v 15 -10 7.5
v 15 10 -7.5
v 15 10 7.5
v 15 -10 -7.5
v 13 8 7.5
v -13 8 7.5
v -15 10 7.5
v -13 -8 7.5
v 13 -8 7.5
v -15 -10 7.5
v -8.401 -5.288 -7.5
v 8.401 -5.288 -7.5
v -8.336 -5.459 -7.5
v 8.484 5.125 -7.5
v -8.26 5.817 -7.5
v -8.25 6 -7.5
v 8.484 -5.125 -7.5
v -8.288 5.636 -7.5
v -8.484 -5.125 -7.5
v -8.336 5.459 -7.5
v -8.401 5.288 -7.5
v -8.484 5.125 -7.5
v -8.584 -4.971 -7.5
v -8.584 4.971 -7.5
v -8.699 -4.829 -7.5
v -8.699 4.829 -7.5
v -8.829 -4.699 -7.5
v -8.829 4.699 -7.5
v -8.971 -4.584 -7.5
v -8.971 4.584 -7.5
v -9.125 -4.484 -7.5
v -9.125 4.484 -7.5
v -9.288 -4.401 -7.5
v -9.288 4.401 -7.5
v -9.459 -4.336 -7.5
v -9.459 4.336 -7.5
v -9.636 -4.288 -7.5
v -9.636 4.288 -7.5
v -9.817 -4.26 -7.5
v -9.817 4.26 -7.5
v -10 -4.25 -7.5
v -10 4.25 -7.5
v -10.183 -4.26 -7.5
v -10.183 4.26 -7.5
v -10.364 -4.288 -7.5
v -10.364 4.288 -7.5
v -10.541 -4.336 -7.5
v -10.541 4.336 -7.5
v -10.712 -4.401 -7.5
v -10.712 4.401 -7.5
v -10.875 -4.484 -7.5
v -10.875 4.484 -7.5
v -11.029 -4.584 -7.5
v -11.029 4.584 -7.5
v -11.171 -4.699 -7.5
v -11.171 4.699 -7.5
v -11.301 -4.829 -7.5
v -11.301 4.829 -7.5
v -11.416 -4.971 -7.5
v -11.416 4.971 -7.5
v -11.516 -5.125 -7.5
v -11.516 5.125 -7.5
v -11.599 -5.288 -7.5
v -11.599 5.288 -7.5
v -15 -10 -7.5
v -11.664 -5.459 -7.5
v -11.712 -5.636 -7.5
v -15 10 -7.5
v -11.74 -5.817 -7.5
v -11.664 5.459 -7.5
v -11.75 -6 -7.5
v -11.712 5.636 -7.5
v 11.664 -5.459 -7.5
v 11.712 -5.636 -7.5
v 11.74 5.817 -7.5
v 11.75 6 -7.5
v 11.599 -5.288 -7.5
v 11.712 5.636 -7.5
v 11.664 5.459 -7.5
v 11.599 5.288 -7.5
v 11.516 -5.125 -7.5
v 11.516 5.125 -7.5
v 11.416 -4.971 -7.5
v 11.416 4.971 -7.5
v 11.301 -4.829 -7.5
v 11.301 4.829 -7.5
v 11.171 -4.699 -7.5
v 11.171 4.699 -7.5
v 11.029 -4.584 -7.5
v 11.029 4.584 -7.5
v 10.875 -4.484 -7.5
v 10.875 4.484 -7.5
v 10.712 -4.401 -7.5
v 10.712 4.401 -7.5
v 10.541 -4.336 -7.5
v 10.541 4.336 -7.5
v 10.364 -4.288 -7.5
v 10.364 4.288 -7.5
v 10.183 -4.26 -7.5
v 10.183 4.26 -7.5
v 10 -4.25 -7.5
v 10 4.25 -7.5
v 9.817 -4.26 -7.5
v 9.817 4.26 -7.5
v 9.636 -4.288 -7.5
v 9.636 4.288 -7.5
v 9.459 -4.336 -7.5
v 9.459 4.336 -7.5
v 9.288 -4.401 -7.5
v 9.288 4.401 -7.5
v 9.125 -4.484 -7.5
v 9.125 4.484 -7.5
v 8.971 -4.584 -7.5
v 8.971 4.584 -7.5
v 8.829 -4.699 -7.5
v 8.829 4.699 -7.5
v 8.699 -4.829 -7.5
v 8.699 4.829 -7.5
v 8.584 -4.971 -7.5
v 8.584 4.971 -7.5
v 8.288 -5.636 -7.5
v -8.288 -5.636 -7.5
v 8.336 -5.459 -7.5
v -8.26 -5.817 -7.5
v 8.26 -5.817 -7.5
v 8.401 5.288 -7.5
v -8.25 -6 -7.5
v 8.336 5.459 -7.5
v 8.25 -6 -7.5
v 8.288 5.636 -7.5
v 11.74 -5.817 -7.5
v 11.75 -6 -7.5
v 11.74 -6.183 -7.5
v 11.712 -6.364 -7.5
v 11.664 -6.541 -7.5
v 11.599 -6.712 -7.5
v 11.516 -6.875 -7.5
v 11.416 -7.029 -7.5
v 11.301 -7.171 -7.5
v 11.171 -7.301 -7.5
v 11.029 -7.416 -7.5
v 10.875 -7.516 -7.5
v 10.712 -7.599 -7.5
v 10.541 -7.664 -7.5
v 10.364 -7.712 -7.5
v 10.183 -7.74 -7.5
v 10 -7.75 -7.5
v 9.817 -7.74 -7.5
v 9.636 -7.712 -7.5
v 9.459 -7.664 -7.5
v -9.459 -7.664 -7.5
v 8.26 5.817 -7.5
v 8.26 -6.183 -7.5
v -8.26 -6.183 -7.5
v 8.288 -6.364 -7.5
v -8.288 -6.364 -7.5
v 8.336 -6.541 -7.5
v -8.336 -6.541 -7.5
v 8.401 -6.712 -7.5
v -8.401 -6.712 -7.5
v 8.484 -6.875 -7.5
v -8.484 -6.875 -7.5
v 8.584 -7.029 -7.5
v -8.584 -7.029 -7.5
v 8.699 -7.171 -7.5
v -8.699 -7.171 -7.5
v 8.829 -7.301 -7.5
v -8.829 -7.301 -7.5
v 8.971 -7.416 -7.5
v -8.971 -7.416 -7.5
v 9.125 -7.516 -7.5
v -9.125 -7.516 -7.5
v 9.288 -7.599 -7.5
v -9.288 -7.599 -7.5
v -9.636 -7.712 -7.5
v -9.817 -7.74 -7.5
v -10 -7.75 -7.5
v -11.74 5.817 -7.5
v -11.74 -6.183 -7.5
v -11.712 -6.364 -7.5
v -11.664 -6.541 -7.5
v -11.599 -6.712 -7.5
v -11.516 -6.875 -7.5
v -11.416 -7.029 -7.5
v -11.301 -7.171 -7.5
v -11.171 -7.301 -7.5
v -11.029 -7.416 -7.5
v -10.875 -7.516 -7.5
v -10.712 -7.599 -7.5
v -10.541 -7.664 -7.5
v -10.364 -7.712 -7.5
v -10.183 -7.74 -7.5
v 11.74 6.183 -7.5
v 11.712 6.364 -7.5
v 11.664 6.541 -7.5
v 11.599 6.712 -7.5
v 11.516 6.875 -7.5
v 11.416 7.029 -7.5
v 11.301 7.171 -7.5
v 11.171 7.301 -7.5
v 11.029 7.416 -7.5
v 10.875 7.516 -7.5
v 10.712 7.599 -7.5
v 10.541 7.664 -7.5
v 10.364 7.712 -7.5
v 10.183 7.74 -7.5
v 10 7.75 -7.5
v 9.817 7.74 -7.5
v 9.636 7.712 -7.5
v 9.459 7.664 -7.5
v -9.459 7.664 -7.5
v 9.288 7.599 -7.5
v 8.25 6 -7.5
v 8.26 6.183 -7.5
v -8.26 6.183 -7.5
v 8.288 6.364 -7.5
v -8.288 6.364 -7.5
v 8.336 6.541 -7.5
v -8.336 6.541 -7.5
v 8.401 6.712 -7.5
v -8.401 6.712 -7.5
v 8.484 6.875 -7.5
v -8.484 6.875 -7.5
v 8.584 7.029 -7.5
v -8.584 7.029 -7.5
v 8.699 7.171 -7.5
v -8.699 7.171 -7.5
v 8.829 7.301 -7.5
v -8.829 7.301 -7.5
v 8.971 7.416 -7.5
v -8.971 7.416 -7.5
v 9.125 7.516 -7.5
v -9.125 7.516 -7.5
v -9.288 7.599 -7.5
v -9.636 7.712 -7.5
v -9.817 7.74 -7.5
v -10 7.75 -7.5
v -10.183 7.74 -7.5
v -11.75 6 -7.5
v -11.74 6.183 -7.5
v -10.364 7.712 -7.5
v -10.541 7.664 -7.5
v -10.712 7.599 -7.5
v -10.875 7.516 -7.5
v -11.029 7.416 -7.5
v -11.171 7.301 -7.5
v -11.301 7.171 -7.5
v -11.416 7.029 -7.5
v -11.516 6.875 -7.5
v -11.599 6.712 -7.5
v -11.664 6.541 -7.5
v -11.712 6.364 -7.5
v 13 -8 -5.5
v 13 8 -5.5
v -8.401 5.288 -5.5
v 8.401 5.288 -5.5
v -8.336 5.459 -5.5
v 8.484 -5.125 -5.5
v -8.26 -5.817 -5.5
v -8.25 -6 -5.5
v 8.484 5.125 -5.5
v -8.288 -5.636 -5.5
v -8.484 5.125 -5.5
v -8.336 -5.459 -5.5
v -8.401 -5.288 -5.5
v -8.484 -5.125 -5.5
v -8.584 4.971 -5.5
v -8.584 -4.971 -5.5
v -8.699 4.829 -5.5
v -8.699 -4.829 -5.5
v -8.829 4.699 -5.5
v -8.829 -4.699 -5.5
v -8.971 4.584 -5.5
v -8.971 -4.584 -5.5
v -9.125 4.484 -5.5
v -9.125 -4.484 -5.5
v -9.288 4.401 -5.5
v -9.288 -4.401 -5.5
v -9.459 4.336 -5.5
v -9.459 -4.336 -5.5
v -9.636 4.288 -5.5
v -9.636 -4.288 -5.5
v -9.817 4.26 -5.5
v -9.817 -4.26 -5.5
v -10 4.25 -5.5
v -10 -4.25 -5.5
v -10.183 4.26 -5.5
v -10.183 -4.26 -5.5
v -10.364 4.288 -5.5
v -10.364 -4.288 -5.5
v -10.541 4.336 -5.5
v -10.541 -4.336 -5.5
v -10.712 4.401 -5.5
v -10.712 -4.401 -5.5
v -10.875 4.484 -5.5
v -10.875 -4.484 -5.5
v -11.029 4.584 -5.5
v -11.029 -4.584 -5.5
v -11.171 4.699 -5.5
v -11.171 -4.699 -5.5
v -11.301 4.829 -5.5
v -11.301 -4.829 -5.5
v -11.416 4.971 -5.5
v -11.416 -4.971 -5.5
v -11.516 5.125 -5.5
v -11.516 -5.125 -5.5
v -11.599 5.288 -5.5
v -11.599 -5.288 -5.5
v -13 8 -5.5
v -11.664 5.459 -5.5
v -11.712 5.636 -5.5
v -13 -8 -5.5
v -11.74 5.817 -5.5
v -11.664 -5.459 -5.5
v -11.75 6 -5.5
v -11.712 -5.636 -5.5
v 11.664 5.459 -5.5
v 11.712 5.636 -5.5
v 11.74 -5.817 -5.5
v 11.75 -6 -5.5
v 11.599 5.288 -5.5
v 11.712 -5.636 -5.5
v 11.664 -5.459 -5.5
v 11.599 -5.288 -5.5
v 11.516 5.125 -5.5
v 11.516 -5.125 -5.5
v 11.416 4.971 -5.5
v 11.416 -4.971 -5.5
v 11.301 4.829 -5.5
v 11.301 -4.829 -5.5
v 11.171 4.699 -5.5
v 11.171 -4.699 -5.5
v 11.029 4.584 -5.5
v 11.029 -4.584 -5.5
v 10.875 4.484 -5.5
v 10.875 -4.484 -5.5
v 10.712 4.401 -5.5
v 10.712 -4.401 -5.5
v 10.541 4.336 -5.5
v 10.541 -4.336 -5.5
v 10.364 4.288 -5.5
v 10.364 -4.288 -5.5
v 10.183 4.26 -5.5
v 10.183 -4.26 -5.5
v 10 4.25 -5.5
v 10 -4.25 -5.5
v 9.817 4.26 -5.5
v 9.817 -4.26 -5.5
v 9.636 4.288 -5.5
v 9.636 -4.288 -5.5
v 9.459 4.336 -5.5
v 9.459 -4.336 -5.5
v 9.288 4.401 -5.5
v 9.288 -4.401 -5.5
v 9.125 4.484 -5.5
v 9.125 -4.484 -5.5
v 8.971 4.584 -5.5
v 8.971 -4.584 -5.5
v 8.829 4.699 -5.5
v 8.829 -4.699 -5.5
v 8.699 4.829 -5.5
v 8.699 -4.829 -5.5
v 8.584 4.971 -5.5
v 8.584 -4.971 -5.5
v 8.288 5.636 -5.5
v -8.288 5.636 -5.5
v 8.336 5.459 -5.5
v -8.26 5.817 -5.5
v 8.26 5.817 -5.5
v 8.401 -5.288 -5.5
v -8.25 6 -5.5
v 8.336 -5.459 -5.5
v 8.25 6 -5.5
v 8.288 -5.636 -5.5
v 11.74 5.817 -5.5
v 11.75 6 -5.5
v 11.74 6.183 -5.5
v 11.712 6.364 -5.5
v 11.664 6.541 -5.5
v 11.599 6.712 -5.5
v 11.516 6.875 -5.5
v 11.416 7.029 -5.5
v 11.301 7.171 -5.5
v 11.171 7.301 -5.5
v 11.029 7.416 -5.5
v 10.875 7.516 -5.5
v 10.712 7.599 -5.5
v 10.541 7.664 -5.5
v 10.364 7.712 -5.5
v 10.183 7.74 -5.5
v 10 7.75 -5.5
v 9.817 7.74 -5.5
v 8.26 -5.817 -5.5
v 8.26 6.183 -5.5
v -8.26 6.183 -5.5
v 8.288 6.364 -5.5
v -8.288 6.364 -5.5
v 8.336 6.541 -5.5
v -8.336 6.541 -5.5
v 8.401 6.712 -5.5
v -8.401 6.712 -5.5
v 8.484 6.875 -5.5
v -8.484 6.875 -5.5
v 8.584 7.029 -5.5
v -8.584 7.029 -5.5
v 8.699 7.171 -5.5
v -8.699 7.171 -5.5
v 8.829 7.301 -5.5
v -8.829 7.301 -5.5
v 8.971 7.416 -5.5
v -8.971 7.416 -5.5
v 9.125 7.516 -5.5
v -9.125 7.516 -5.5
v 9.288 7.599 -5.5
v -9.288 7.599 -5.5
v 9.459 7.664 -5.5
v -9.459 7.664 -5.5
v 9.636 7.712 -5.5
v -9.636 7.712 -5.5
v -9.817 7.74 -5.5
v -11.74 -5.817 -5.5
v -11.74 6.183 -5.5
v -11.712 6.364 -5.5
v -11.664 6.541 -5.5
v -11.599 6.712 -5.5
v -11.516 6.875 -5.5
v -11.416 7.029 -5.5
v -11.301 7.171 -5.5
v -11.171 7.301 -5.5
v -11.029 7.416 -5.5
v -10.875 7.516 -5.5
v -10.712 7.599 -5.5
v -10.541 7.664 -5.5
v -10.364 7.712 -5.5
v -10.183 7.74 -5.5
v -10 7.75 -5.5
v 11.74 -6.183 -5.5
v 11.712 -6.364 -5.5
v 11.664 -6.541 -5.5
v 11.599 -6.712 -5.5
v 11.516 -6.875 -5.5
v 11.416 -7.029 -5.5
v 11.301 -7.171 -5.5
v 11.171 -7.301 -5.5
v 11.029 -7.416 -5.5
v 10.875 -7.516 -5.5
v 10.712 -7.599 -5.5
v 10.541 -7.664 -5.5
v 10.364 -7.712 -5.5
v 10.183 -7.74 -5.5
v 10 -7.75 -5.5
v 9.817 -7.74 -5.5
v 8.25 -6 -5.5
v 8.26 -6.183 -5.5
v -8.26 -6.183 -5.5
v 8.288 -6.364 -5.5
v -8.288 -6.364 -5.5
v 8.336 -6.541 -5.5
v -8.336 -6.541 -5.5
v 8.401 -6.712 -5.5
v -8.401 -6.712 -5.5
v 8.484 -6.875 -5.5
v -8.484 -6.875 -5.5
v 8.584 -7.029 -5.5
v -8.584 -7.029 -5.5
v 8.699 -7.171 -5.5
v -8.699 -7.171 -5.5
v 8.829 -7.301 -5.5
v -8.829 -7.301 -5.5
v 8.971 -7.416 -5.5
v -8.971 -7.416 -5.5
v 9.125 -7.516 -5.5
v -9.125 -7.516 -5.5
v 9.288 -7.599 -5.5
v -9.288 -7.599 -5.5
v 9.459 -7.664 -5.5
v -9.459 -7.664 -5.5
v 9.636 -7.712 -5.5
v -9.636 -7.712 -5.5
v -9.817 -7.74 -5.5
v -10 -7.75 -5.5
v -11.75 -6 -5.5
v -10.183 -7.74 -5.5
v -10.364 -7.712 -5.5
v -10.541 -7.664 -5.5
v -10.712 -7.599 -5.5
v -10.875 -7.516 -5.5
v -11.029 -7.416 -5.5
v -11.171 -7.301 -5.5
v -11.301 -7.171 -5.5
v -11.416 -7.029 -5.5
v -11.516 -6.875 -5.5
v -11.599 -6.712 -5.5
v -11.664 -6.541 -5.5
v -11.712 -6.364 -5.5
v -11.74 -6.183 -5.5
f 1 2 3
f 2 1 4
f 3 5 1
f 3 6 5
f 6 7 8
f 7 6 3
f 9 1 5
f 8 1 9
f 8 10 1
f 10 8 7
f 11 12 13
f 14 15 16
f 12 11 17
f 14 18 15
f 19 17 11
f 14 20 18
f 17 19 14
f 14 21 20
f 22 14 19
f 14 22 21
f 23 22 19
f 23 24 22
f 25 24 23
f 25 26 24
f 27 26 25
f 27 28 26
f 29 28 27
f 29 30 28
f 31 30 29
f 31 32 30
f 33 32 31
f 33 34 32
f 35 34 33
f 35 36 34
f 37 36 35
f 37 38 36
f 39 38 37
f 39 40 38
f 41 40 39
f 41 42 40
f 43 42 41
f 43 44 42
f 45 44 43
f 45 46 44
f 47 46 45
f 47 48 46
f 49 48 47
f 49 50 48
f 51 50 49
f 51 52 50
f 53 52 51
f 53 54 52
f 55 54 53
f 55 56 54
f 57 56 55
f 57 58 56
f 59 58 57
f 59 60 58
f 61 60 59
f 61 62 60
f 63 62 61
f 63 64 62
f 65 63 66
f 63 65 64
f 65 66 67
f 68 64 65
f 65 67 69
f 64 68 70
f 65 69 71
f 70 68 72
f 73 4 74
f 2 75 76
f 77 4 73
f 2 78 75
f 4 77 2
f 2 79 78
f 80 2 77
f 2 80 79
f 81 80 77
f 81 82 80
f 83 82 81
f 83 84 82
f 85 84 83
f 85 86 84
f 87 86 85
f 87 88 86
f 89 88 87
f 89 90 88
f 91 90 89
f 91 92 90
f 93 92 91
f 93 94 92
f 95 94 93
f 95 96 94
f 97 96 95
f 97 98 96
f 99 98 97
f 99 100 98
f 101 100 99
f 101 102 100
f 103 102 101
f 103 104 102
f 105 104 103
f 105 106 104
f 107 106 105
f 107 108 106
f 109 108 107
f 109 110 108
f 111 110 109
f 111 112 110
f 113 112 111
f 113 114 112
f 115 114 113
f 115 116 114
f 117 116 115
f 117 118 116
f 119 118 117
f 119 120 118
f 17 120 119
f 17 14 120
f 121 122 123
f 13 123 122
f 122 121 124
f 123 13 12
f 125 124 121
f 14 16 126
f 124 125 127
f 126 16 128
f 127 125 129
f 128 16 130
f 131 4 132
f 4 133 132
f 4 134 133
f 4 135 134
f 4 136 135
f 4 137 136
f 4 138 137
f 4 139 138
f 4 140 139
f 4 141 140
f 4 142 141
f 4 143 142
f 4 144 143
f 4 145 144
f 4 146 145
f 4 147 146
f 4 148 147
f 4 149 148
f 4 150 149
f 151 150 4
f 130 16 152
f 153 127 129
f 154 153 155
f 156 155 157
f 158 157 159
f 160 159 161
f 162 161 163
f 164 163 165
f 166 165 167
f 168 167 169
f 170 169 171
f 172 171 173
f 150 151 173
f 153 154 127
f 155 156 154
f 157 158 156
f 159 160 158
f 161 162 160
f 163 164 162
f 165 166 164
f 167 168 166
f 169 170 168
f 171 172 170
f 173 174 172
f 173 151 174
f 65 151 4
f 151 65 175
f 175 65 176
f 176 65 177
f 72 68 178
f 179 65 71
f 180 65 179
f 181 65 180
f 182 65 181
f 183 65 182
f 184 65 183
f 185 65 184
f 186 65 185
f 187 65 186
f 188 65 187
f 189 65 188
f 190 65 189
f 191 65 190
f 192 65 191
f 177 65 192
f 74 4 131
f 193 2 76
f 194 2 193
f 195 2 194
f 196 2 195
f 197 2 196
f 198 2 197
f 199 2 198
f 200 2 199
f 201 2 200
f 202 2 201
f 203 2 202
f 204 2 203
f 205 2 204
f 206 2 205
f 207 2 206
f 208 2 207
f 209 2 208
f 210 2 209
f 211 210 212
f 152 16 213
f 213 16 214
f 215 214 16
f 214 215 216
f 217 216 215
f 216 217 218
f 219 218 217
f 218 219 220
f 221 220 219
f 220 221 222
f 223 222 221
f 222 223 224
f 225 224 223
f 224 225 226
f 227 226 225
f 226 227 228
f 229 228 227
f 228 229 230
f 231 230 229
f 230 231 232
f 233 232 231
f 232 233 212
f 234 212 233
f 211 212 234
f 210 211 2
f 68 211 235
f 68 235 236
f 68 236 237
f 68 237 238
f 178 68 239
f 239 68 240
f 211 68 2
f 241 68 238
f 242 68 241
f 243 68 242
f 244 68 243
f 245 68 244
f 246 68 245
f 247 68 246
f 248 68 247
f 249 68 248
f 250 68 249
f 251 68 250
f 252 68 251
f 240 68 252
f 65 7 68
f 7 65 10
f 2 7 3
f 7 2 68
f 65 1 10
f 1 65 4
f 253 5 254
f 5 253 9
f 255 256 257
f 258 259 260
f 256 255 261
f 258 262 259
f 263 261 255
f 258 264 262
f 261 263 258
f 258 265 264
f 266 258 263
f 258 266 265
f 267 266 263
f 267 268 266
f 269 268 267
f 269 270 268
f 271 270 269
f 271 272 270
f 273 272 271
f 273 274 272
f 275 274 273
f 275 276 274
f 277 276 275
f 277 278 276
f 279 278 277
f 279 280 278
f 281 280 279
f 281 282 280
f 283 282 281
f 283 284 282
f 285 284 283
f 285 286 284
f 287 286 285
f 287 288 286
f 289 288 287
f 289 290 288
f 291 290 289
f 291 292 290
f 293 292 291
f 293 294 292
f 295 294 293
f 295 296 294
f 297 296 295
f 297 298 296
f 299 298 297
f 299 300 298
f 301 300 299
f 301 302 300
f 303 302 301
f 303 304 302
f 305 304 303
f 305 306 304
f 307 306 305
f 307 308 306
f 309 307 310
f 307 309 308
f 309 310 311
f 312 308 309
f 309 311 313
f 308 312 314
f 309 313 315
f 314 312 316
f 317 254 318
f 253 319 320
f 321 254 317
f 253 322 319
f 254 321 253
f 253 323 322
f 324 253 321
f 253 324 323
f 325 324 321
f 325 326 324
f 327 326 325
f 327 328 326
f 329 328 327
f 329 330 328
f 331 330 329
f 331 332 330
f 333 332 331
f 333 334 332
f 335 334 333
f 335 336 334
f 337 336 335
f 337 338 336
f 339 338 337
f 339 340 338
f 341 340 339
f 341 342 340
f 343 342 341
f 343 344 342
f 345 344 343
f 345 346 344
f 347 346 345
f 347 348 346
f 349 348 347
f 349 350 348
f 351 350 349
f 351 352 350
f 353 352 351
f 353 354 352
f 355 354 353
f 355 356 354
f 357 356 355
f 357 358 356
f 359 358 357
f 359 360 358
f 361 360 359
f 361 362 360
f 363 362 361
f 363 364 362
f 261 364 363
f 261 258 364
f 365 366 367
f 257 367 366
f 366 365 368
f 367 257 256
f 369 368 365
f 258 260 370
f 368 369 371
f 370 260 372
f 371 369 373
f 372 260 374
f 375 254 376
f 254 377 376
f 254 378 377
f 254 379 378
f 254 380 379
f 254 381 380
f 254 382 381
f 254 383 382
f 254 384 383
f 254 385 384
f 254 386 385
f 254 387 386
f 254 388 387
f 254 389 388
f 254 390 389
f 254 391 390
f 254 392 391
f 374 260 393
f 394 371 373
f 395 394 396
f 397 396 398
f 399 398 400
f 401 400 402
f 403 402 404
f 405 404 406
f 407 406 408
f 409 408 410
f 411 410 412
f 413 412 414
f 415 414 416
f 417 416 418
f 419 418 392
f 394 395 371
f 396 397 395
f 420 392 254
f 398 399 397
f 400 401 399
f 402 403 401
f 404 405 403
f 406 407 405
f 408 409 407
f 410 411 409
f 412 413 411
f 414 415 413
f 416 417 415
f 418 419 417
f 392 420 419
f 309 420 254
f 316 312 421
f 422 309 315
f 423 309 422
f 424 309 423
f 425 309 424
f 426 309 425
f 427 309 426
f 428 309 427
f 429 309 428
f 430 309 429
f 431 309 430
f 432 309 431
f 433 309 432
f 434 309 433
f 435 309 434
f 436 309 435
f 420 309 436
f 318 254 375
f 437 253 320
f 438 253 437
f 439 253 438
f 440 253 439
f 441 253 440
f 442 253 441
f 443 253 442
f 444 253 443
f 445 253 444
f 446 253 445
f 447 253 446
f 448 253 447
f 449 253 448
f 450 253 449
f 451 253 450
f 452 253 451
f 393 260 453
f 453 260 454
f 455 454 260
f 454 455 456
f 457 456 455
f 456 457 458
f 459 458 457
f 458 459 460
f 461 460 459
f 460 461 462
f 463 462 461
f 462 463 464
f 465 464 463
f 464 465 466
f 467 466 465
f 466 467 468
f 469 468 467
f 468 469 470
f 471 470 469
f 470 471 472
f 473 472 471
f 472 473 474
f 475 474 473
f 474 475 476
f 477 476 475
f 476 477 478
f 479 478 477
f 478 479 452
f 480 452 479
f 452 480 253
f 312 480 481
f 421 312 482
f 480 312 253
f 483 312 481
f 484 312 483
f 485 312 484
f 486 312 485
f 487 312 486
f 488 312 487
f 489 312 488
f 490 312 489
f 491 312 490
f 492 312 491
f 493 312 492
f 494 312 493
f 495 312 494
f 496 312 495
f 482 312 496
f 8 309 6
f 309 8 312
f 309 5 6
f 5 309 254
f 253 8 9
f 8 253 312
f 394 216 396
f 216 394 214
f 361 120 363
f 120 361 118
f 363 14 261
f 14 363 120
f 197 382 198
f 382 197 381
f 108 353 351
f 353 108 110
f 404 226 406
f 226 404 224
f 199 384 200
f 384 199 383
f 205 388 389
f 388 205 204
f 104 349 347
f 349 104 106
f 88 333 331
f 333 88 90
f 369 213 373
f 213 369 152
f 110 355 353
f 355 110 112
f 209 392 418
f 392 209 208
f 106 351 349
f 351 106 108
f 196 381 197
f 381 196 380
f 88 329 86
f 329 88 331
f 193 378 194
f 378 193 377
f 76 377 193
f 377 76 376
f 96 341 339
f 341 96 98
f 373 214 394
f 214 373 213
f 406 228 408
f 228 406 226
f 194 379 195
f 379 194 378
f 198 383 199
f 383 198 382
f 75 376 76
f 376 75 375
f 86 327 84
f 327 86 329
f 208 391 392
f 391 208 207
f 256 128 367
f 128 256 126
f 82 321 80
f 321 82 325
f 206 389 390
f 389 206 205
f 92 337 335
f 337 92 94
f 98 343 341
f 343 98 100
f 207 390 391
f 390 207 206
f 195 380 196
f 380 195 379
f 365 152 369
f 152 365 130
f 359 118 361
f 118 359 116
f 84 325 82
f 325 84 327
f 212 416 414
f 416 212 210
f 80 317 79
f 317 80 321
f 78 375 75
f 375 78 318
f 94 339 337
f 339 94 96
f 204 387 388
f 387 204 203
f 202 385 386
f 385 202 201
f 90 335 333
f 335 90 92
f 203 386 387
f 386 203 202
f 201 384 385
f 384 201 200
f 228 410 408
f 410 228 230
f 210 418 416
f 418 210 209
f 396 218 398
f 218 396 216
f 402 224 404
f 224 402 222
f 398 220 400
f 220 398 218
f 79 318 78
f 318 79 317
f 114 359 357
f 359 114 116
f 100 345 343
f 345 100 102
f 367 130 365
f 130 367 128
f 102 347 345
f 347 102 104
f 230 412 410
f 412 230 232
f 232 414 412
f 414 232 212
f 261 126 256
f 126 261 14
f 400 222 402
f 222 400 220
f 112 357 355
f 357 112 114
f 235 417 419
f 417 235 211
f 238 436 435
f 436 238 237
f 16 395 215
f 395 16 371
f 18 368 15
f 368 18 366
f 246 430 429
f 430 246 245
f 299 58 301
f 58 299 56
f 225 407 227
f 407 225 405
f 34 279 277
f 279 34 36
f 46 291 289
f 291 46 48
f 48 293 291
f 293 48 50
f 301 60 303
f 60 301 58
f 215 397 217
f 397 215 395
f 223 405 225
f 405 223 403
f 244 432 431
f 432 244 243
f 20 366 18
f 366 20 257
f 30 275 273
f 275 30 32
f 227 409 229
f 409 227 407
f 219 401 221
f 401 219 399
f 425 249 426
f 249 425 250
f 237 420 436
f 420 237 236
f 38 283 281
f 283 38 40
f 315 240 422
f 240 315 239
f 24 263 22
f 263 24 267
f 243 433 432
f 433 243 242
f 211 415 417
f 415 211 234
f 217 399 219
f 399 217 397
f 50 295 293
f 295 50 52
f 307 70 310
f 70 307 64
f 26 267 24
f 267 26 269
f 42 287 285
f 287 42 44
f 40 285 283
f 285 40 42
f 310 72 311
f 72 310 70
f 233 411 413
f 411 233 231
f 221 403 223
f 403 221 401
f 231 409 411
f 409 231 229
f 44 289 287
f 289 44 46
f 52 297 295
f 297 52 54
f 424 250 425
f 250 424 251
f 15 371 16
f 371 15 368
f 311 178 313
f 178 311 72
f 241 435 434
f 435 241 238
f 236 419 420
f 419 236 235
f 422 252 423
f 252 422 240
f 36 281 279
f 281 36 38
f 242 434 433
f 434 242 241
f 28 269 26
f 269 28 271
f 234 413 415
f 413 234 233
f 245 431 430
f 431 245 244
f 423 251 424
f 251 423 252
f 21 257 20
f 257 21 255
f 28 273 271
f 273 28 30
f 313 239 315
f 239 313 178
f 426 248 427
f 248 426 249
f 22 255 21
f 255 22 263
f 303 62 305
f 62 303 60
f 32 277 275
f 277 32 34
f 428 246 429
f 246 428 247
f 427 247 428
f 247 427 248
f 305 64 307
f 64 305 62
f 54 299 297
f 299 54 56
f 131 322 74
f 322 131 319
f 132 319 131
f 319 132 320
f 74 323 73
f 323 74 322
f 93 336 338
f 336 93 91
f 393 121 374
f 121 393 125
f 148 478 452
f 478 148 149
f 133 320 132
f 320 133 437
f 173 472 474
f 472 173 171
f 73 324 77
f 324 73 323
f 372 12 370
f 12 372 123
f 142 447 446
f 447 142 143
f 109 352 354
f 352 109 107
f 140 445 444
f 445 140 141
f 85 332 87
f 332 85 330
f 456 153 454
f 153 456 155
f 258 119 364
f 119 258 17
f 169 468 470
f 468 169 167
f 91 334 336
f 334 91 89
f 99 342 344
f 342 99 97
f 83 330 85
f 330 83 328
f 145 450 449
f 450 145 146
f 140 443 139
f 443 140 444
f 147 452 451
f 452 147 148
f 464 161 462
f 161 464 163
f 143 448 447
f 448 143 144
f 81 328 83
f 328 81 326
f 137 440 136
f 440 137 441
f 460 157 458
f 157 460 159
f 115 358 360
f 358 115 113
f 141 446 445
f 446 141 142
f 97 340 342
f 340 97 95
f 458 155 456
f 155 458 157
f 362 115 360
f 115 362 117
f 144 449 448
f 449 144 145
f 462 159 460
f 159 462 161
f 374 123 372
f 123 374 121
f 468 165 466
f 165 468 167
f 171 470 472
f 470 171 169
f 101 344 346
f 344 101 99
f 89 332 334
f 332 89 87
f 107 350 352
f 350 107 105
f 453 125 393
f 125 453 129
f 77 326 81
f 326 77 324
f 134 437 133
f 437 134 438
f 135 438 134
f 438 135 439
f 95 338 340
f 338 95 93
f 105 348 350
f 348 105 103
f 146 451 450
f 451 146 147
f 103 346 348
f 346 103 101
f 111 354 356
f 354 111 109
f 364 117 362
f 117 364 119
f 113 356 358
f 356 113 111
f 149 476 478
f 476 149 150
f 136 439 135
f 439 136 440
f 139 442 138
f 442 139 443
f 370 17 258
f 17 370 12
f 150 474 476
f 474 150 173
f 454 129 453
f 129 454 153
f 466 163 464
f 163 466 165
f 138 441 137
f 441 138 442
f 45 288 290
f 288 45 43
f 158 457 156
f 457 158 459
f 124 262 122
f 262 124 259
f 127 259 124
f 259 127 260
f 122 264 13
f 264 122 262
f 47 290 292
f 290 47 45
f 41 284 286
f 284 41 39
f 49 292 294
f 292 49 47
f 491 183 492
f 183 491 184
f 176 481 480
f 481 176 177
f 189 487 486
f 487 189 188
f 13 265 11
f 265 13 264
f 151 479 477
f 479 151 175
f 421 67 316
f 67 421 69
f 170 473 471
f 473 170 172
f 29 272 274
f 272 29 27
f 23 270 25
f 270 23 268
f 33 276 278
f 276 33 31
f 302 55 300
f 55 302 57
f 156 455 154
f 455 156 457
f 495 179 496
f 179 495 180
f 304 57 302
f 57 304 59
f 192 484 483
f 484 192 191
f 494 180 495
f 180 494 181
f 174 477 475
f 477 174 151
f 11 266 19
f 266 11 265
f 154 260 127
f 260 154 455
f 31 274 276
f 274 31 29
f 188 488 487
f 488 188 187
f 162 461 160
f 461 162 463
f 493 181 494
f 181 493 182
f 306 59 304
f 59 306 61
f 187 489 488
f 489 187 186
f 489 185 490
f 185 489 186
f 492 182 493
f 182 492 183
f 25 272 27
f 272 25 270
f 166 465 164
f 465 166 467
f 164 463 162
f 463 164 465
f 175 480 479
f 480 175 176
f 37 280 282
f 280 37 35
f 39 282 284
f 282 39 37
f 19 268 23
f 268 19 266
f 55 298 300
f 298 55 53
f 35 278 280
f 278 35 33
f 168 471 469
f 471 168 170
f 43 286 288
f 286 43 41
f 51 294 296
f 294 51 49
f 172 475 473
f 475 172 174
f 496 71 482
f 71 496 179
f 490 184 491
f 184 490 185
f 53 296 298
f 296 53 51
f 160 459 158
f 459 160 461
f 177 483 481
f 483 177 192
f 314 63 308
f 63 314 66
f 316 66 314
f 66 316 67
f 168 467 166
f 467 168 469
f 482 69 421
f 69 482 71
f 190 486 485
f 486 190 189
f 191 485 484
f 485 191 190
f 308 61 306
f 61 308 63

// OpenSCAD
// Demo: Rounded box with mounting holes
// The browser never executes this script — it is sent to the server for rendering.
$fn = 60;

difference() {
  cube([30, 20, 15], center = true);
  translate([0, 0, 2])
    cube([26, 16, 15], center = true);
  translate([10, 6, 0]) cylinder(h = 20, d = 3.5, center = true);
  translate([-10, 6, 0]) cylinder(h = 20, d = 3.5, center = true);
  translate([10, -6, 0]) cylinder(h = 20, d = 3.5, center = true);
  translate([-10, -6, 0]) cylinder(h = 20, d = 3.5, center = true);
}
